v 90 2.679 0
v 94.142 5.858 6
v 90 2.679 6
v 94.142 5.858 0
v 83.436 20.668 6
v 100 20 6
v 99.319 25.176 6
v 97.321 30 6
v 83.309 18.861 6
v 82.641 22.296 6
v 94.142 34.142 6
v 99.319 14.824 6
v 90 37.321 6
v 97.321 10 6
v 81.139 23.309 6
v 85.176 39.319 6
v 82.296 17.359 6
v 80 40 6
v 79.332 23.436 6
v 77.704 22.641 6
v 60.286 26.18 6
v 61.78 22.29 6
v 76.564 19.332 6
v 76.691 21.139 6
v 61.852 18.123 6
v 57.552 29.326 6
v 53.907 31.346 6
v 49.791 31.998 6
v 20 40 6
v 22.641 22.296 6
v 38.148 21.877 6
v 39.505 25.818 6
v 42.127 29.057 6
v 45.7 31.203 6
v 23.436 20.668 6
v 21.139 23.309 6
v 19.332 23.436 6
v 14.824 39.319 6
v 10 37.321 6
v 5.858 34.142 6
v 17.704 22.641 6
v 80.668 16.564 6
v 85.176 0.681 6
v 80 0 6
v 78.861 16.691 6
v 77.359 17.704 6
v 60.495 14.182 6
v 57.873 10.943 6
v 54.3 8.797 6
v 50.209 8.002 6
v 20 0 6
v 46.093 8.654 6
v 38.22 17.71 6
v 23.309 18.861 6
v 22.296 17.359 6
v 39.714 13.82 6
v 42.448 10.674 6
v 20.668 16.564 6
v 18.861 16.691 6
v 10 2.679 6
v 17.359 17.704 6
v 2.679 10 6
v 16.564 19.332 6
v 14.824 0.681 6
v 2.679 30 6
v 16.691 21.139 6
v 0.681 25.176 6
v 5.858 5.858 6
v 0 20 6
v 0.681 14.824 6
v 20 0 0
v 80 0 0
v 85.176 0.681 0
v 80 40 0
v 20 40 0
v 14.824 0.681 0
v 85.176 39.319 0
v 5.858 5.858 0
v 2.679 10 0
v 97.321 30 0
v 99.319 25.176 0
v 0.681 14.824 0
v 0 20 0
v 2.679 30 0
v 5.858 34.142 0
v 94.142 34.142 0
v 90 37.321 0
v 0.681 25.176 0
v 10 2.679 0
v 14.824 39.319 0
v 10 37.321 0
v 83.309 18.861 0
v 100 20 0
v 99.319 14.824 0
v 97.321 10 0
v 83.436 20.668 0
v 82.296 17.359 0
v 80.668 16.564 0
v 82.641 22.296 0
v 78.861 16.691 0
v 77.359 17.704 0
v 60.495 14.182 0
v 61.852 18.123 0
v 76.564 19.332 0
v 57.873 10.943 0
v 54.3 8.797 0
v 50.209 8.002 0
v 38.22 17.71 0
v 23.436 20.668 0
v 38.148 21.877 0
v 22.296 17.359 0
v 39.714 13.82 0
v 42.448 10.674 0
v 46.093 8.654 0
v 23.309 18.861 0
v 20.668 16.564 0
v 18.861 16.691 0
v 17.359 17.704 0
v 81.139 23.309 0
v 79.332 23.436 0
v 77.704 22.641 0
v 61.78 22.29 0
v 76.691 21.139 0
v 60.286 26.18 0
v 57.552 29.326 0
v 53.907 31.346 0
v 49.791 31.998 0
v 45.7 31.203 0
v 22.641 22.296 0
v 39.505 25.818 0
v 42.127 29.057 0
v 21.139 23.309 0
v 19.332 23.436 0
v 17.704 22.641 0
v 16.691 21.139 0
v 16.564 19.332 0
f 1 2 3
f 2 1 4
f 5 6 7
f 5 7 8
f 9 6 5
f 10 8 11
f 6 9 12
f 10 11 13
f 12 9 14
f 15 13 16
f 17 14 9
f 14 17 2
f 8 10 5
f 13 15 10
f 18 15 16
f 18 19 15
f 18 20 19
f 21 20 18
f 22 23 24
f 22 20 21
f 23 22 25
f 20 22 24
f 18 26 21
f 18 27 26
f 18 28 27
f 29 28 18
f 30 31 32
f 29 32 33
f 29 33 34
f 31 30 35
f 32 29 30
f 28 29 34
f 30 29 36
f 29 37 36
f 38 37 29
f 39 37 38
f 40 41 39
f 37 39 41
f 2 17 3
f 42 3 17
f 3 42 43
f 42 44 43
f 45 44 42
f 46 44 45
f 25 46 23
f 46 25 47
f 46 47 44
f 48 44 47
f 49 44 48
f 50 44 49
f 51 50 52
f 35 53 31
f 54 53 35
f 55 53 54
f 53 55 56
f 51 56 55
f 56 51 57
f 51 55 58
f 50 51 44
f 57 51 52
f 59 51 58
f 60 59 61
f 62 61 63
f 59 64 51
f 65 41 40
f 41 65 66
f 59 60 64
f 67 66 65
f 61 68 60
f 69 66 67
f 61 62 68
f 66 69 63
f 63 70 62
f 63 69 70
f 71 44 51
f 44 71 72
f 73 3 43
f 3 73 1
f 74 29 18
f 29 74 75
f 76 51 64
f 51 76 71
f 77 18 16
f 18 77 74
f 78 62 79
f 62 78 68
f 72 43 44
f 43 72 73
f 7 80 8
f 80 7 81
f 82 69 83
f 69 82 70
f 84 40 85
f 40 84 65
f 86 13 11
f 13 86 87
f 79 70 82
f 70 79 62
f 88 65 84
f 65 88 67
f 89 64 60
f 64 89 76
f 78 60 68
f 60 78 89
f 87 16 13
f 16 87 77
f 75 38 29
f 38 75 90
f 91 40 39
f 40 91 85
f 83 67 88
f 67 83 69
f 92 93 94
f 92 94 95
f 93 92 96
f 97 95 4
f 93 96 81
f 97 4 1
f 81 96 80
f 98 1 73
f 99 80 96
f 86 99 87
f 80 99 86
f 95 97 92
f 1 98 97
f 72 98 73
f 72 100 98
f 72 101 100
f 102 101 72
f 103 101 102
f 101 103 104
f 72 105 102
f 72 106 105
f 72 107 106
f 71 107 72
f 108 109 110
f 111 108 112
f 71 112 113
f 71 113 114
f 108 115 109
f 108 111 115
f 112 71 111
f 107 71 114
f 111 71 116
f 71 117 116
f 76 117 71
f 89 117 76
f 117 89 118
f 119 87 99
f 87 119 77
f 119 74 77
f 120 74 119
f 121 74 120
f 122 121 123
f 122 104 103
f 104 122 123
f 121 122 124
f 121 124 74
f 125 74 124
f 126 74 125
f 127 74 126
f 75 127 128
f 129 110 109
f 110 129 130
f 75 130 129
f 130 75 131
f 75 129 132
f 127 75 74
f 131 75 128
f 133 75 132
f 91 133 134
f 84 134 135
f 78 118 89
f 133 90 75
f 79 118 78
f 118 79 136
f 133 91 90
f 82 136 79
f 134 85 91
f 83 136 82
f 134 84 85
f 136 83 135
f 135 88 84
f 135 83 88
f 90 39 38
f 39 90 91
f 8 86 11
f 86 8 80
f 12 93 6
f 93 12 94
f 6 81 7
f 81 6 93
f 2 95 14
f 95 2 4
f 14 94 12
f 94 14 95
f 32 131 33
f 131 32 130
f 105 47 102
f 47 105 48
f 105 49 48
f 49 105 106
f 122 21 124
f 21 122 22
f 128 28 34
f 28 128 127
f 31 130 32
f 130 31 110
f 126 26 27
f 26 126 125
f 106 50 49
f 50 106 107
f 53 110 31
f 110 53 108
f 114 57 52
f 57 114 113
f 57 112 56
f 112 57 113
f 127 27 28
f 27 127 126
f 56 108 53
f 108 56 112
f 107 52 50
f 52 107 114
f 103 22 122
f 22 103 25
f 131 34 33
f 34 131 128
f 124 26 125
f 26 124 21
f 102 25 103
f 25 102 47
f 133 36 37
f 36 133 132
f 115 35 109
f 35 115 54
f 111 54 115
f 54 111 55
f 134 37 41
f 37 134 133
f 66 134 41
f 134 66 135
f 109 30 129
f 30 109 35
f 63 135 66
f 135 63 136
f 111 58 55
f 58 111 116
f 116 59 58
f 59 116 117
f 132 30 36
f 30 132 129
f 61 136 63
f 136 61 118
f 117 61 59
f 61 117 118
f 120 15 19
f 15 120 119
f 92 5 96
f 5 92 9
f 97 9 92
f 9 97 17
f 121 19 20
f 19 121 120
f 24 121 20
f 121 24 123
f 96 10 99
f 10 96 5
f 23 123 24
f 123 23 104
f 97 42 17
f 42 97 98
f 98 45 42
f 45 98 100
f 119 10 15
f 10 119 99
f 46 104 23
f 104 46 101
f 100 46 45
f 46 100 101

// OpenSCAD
$fn = 32;
// target_bbox: 100, 40, 6
// ----------------------------------------------------------------------
// Spacer plate: obround span 60, caps R20
// ----------------------------------------------------------------------

// --- parameters (mm) ---
bore_r = 12;              // centre bore radius
bolt_r = 3.5;             // bolt hole radius
plate_t = 6;              // plate thickness, Z (extrusion height)
span = 60;                // obround span
cap_r = 20;               // cap radius

profile = [[20, 40], [14.824, 39.319], [10, 37.321], [5.858, 34.142], [2.679, 30], [0.681, 25.176], [0, 20], [0.681, 14.824], [2.679, 10], [5.858, 5.858], [10, 2.679], [14.824, 0.681], [20, 0], [80, 0], [85.176, 0.681], [90, 2.679], [94.142, 5.858], [97.321, 10], [99.319, 14.824], [100, 20], [99.319, 25.176], [97.321, 30], [94.142, 34.142], [90, 37.321], [85.176, 39.319], [80, 40]];  // primary outline, 26 points, counter clockwise
void_1 = [[61.78, 22.29], [60.286, 26.18], [57.552, 29.326], [53.907, 31.346], [49.791, 31.998], [45.7, 31.203], [42.127, 29.057], [39.505, 25.818], [38.148, 21.877], [38.22, 17.71], [39.714, 13.82], [42.448, 10.674], [46.093, 8.654], [50.209, 8.002], [54.3, 8.797], [57.873, 10.943], [60.495, 14.182], [61.852, 18.123]];  // centre bore, 18 points
void_2 = [[23.436, 20.668], [22.641, 22.296], [21.139, 23.309], [19.332, 23.436], [17.704, 22.641], [16.691, 21.139], [16.564, 19.332], [17.359, 17.704], [18.861, 16.691], [20.668, 16.564], [22.296, 17.359], [23.309, 18.861]];  // end hole, 12 points
void_3 = [[83.436, 20.668], [82.641, 22.296], [81.139, 23.309], [79.332, 23.436], [77.704, 22.641], [76.691, 21.139], [76.564, 19.332], [77.359, 17.704], [78.861, 16.691], [80.668, 16.564], [82.296, 17.359], [83.309, 18.861]];  // end hole, 12 points

// --- the one profile operation ---
difference() {
  linear_extrude(height = plate_t) polygon(points = profile);
  translate([0, 0, -1])
    linear_extrude(height = plate_t + 2) polygon(points = void_1);
  translate([0, 0, -1])
    linear_extrude(height = plate_t + 2) polygon(points = void_2);
  translate([0, 0, -1])
    linear_extrude(height = plate_t + 2) polygon(points = void_3);
}
